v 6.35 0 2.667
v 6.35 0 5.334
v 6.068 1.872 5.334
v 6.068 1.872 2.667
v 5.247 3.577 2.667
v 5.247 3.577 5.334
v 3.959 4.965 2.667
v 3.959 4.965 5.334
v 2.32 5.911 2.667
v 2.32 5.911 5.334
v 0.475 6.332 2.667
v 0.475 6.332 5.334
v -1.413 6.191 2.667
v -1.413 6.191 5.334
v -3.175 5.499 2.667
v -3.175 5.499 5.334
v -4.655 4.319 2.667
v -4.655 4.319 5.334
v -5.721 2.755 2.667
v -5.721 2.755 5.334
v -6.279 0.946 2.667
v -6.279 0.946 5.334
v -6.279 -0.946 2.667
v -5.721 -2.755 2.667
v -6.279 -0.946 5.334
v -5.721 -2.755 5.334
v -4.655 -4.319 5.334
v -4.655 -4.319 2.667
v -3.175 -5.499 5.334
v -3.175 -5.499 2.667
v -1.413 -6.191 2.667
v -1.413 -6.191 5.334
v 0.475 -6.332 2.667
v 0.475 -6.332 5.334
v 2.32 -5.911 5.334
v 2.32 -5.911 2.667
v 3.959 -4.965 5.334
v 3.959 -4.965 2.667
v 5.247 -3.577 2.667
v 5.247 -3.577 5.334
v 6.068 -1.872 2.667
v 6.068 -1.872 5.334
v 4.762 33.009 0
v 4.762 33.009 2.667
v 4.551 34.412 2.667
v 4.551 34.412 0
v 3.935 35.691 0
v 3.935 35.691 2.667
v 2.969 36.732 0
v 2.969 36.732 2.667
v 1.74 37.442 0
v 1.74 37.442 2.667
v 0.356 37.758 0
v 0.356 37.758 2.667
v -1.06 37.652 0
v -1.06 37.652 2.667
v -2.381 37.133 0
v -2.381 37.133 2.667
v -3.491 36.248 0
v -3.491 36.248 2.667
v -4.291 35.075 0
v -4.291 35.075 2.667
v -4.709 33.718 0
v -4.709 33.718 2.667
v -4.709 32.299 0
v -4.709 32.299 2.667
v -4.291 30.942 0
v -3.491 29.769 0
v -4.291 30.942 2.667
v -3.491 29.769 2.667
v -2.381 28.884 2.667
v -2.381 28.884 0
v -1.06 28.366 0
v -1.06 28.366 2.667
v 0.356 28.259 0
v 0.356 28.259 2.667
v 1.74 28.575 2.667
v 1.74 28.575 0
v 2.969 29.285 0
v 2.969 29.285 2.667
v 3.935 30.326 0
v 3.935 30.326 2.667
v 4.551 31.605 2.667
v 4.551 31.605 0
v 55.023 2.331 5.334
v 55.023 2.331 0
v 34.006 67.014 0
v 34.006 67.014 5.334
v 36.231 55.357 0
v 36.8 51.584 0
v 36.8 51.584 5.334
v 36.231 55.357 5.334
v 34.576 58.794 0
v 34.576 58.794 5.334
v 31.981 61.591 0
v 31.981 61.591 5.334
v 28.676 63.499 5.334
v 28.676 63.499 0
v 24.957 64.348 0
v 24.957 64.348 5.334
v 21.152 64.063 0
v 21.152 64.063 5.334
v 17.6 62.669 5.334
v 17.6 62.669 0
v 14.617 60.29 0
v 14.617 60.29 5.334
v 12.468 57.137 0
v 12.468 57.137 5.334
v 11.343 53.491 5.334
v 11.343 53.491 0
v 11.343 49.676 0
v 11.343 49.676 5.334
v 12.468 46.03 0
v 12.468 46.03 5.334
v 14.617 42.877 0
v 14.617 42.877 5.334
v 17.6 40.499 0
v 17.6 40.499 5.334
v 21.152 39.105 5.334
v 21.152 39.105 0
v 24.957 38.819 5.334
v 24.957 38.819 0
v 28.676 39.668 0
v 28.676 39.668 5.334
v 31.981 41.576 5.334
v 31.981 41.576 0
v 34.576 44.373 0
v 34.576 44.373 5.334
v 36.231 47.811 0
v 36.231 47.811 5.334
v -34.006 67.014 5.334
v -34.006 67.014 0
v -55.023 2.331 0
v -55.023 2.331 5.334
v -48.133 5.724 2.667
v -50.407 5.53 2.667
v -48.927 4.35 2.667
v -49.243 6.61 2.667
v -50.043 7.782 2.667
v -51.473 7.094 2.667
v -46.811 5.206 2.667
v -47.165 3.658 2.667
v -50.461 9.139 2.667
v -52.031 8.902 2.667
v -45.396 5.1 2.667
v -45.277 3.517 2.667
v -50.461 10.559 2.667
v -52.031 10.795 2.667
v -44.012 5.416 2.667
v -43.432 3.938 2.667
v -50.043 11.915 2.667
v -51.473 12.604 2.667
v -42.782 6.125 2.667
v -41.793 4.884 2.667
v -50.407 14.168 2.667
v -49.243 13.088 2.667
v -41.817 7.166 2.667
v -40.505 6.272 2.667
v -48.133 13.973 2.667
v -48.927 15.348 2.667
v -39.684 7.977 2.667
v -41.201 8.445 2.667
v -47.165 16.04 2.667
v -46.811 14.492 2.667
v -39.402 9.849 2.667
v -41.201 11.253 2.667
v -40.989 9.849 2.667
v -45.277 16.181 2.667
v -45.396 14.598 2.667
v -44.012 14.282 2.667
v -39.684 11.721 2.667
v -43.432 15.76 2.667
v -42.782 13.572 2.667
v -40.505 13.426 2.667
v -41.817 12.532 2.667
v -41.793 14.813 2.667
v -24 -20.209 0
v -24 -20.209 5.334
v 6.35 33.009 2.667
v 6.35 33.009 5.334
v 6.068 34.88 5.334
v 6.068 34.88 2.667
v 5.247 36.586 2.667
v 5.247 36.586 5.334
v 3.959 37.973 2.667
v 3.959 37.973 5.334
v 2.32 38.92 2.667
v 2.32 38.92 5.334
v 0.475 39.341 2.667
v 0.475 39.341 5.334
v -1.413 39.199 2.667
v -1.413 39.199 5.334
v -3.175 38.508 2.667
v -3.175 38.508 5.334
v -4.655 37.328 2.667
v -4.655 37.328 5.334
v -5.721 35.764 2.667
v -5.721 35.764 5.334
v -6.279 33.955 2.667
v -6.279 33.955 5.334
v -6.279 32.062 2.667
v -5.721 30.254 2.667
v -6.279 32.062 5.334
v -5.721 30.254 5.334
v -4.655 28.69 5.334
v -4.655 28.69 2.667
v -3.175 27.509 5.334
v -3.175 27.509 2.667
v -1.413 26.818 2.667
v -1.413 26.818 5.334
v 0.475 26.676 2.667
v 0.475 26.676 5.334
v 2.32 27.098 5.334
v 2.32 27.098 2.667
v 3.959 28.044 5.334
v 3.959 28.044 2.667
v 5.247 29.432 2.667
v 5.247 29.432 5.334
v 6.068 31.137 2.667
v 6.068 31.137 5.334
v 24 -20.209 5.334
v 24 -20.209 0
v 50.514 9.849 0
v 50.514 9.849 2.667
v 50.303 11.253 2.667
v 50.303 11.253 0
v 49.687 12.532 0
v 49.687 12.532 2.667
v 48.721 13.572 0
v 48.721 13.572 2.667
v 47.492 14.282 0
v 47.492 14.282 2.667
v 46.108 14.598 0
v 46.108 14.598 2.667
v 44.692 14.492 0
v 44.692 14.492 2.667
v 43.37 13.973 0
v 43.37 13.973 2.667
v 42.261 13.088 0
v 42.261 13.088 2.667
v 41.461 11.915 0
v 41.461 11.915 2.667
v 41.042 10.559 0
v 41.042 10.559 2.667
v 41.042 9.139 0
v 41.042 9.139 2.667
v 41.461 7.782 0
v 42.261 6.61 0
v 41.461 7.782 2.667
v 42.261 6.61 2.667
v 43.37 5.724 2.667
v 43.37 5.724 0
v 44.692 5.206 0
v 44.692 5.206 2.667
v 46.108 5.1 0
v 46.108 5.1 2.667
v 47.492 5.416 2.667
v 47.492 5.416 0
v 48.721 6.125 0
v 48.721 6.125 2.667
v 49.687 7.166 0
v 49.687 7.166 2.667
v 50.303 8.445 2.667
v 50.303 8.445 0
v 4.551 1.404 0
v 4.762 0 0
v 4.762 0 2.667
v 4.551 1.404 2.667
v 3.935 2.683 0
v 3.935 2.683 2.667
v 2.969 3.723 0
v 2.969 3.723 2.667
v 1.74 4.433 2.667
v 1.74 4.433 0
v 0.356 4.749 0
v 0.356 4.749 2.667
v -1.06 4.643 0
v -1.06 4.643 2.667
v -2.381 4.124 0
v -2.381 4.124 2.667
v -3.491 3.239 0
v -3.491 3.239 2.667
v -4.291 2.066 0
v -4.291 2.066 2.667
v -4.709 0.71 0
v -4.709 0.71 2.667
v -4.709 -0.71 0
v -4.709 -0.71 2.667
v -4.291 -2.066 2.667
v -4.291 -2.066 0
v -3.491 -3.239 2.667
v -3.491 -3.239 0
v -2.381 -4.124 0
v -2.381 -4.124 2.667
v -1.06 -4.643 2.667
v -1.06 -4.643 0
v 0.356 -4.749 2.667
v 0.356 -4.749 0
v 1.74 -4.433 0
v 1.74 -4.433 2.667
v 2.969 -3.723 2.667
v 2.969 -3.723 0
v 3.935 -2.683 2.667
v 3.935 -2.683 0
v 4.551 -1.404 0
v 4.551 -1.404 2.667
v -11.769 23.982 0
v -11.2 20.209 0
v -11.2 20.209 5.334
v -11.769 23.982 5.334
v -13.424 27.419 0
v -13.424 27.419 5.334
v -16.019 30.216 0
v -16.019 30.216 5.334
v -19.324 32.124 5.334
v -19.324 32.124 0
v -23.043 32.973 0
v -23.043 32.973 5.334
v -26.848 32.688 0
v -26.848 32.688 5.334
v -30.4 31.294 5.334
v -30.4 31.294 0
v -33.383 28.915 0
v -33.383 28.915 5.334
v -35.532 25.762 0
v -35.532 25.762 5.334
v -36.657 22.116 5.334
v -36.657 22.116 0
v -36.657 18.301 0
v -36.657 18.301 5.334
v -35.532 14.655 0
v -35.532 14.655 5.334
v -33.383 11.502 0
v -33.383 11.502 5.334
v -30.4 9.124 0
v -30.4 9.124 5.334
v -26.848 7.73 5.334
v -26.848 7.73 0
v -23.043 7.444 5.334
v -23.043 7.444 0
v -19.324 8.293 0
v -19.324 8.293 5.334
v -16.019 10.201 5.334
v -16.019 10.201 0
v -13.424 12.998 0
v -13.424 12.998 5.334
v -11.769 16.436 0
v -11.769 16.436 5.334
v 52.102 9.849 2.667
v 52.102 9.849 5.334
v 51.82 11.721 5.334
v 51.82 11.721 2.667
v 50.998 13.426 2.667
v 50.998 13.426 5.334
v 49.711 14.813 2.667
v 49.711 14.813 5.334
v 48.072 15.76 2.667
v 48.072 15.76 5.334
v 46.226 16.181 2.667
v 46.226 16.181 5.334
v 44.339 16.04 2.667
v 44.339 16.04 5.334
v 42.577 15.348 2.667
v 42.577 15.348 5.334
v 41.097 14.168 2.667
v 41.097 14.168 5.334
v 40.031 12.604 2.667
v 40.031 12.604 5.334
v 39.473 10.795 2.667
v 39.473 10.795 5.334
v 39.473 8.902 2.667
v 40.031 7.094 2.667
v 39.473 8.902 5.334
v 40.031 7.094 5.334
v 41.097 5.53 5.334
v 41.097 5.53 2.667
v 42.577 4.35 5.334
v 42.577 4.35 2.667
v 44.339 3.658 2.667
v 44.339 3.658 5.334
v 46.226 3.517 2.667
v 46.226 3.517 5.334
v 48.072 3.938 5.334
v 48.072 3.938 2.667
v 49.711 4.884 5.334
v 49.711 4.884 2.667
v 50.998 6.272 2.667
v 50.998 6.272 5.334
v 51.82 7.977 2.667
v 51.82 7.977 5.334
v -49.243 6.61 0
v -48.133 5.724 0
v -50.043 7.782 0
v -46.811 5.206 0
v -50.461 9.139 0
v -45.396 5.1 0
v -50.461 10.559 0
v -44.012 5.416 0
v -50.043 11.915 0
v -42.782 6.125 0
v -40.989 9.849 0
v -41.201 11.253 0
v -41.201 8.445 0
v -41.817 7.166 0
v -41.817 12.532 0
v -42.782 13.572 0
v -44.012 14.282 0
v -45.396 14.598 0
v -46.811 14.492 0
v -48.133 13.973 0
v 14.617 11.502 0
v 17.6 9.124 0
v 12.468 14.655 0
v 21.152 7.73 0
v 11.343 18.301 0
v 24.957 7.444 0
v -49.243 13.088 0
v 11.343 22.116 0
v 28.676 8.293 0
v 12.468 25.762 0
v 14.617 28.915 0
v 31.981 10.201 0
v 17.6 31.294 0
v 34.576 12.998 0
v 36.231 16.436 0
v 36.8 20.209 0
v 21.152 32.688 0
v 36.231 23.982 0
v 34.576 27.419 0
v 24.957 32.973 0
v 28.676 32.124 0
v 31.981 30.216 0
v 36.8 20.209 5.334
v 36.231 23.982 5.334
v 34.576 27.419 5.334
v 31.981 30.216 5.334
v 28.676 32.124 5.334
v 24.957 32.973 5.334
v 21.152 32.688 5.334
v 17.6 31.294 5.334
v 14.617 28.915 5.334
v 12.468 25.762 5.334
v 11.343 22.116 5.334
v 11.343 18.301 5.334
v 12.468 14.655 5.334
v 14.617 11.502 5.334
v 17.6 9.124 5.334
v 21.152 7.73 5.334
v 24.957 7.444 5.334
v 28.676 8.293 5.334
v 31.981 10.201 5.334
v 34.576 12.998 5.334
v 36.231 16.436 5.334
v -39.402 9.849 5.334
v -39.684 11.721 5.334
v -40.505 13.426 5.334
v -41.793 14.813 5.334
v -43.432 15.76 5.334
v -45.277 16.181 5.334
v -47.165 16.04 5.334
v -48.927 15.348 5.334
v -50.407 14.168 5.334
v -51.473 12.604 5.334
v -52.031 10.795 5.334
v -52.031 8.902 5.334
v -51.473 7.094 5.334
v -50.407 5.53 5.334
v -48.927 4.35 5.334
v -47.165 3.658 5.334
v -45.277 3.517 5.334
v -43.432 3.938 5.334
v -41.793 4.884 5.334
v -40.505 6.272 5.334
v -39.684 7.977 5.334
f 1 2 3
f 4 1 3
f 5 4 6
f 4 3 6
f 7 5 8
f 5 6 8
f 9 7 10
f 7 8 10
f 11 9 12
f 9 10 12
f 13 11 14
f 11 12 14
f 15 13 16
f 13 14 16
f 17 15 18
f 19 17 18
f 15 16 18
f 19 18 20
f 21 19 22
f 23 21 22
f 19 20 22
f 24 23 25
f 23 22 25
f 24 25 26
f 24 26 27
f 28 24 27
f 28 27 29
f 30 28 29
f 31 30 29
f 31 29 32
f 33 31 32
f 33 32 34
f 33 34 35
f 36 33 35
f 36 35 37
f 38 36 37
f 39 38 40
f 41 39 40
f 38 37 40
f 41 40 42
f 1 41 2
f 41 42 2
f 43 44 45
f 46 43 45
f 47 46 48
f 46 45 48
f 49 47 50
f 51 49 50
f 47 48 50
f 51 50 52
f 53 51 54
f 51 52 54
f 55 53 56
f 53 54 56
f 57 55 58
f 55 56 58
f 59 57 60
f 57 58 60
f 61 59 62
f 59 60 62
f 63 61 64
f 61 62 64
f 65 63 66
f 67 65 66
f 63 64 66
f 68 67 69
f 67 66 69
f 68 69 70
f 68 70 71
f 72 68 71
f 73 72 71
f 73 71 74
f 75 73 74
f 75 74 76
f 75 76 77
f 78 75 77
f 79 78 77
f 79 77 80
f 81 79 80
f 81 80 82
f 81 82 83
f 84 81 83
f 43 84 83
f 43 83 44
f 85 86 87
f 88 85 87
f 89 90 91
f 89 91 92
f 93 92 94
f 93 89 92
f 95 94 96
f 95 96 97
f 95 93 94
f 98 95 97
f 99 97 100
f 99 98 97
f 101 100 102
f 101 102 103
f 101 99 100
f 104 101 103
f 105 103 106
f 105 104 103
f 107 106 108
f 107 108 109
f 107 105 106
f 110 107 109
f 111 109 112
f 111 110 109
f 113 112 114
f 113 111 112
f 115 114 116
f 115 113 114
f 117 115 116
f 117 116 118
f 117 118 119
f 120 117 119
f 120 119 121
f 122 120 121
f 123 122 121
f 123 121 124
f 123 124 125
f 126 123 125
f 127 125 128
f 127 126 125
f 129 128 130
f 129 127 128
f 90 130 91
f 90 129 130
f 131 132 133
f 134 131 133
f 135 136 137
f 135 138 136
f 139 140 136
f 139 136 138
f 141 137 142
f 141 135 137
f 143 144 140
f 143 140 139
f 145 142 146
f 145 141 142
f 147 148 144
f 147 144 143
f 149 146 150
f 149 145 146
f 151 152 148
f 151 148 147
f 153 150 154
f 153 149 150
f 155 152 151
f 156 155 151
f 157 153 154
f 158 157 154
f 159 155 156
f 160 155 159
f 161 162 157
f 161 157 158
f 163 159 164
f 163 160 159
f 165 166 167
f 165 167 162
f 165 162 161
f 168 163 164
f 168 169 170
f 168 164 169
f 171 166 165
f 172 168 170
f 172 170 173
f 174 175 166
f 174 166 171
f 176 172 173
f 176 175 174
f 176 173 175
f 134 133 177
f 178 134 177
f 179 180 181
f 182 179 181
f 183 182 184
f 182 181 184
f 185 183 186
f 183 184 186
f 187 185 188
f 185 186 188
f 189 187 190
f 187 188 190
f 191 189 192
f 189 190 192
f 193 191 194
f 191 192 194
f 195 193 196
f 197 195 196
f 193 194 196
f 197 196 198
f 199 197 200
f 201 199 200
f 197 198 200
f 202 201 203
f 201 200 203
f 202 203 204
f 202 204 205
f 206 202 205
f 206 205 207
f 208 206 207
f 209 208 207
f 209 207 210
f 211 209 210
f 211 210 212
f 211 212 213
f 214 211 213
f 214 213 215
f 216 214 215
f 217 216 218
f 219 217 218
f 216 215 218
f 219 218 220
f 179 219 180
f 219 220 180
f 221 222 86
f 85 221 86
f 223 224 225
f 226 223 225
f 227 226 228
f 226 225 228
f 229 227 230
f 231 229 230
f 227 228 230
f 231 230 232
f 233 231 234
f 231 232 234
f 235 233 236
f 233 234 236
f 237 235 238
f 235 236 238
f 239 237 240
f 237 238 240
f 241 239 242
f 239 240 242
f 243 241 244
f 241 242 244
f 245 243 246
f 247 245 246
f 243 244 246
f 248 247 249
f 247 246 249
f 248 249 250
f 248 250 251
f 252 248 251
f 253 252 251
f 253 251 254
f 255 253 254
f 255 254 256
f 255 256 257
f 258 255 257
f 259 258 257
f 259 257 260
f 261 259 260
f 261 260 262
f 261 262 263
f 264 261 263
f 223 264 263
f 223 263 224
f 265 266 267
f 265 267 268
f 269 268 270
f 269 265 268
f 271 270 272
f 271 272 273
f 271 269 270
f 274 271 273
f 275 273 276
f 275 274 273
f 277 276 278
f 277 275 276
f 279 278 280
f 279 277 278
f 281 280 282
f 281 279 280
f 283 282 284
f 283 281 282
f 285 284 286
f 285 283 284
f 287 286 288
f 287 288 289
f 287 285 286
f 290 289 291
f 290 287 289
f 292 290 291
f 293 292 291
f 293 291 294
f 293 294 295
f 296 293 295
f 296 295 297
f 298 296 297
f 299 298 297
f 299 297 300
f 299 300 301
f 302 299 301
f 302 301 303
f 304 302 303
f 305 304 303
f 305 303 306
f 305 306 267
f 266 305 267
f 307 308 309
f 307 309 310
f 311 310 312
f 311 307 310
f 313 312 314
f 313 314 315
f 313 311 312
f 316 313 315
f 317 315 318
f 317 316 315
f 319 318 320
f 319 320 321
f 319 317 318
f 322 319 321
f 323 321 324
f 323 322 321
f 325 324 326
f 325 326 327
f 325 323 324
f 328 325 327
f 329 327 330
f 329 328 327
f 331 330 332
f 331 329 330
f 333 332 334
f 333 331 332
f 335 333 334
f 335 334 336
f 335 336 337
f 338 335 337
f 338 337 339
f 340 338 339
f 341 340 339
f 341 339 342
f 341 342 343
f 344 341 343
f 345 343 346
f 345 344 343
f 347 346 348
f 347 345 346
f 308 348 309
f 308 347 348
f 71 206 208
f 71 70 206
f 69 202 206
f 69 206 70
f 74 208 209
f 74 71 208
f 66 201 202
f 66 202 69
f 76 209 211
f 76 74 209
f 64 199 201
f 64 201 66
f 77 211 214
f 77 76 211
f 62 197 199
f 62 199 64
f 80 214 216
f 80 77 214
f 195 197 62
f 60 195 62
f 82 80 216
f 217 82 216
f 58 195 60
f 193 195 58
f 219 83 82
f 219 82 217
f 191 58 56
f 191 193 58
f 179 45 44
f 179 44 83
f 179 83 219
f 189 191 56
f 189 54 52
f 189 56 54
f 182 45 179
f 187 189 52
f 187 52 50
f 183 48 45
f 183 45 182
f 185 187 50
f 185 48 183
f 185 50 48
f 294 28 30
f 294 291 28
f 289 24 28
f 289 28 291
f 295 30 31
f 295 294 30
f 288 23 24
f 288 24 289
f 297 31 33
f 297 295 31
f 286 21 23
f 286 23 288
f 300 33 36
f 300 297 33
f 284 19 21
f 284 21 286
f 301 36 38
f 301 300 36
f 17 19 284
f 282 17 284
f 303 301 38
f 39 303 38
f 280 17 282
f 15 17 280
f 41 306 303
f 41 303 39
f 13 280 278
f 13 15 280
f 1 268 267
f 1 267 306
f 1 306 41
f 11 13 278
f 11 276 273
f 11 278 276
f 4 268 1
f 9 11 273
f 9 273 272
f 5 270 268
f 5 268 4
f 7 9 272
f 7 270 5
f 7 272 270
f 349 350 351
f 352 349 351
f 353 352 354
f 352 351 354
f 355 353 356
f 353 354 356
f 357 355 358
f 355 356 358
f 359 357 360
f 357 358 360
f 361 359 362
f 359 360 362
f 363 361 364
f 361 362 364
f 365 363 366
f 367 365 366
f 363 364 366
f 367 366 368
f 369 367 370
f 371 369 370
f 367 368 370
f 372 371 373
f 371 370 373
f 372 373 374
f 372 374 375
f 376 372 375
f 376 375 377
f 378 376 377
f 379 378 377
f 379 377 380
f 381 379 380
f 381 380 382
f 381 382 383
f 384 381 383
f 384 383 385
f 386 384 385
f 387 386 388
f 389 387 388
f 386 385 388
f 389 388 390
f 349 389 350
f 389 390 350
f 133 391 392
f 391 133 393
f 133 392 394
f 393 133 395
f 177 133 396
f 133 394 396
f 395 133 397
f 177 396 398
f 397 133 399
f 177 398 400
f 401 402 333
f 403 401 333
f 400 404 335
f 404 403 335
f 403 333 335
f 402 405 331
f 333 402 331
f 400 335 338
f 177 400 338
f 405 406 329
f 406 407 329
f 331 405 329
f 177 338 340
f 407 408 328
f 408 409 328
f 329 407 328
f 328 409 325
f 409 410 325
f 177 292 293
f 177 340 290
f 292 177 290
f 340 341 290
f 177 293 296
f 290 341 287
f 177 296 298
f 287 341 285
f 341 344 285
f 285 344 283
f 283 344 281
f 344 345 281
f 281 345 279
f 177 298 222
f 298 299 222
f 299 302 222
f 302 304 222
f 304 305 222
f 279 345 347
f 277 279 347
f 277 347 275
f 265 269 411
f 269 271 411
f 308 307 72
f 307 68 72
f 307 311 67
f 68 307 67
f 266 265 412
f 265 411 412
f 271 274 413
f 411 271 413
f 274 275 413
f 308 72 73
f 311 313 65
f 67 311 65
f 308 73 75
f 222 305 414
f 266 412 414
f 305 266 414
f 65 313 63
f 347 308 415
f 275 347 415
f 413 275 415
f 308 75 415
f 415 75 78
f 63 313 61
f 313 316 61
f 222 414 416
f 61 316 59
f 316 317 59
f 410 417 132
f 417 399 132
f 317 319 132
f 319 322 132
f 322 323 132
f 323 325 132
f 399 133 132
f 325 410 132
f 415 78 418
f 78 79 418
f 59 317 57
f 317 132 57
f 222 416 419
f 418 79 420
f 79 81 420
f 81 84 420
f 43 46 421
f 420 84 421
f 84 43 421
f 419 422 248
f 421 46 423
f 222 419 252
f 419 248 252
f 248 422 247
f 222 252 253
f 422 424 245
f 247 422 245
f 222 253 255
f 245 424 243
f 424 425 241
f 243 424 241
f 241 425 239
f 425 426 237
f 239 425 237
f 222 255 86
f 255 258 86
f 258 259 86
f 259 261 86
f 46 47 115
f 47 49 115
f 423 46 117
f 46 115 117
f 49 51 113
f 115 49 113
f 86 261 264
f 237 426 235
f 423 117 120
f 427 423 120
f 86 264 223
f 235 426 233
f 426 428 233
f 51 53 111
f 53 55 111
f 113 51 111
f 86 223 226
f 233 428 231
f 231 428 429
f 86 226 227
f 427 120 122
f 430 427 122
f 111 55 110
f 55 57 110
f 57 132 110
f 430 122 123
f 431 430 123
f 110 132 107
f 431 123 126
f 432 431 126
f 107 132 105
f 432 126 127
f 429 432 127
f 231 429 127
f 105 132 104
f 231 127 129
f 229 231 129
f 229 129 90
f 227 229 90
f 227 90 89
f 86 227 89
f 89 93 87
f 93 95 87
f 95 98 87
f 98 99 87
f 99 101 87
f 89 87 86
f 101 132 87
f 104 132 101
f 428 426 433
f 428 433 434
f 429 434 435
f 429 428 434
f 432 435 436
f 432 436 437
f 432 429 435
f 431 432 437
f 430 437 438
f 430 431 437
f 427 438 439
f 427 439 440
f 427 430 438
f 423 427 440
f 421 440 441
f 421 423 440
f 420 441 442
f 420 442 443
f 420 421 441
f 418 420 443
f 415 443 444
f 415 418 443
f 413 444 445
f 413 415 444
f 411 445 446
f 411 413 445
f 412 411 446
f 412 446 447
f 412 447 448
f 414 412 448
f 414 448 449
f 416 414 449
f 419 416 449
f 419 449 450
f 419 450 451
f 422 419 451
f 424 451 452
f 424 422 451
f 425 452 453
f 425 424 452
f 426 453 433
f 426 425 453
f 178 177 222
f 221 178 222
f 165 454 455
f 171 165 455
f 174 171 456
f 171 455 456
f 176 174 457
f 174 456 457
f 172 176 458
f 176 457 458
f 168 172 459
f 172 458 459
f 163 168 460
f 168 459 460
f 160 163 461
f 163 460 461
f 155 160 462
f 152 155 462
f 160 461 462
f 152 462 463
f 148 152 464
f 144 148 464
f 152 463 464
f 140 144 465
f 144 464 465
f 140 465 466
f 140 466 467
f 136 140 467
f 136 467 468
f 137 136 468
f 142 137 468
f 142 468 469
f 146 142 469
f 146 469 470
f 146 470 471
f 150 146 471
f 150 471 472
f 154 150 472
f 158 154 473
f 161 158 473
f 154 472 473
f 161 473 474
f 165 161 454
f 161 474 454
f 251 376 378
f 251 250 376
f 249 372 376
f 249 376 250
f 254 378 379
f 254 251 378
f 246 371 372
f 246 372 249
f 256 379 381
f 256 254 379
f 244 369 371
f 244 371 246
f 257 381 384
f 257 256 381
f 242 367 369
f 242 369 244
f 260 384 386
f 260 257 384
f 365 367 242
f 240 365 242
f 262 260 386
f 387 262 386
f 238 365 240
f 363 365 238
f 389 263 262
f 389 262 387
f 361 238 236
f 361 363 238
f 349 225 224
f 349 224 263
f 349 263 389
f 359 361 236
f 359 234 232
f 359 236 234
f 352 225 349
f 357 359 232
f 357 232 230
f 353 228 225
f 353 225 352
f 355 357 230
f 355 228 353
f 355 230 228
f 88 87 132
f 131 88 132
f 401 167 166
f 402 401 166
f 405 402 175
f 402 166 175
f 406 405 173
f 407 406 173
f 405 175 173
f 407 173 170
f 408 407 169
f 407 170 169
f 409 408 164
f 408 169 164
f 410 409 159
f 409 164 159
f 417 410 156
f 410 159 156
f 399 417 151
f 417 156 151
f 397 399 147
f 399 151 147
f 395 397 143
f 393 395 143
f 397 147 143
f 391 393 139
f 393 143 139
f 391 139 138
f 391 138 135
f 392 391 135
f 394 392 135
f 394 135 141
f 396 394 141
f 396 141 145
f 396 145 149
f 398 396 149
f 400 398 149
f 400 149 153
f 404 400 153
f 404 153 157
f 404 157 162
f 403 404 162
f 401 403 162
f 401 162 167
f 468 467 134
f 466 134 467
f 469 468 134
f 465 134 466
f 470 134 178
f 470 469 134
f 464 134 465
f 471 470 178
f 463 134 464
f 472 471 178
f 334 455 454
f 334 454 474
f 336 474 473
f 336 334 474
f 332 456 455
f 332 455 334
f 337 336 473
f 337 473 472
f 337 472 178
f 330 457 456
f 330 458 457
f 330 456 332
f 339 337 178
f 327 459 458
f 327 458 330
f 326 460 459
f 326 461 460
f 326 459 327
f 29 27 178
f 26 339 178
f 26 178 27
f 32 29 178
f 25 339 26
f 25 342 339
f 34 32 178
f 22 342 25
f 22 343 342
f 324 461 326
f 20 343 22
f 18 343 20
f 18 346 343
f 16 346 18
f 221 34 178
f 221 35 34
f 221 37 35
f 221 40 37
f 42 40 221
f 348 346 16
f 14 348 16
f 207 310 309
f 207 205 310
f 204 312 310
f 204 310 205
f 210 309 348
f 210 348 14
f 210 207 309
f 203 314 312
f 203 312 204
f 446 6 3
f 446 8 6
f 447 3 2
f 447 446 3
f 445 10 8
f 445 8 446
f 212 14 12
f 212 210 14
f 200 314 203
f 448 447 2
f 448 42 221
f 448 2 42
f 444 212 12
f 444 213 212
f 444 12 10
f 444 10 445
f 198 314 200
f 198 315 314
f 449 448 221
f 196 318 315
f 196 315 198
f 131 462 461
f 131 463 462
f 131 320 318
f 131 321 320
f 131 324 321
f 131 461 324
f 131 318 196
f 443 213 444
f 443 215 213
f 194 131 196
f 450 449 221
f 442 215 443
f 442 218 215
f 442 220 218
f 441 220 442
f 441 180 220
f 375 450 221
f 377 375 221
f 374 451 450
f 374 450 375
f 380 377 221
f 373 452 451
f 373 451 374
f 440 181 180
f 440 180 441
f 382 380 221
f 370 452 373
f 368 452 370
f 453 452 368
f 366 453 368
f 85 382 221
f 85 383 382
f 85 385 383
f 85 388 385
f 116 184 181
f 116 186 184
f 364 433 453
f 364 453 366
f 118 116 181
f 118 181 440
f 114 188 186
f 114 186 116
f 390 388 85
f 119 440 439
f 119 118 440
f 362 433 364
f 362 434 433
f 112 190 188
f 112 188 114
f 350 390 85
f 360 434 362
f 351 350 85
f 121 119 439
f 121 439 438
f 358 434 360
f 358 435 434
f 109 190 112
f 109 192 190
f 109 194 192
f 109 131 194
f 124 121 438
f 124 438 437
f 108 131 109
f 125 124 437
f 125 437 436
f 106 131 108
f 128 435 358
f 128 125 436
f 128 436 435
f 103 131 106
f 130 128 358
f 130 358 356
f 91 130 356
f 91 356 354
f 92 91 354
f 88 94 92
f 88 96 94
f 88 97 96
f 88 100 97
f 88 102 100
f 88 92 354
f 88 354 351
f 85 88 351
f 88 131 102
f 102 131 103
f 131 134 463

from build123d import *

# Parameters (mm, degrees)
SKETCH2_R           = 4.7625
SKETCH2_R_2         = 12.8
BOSS_EXTRUDE2_DEPTH = 5.334
CUT_EXTRUDE3_START  = -2.667
SKETCH3_R           = 6.35
SKETCH3_R_2         = 4.7625
CUT_EXTRUDE3_DEPTH  = 2.667
SKETCH3_2_R         = 4.7625
CUT_EXTRUDE4_DEPTH  = 87.872399887


with BuildPart() as part:
    # Sketch2 → Boss-Extrude2 (new body)
    with BuildSketch(Plane.XY):
        Polygon((-55.022779977, 2.330692017), (-24, -20.208676973), (24, -20.208676973), (55.022779977, 2.330692017), (34.005948181, 67.013849238), (-34.005948181, 67.013849238), align=None)
        Circle(SKETCH2_R, mode=Mode.SUBTRACT)
        with Locations((-24, 20.208676973)):
            Circle(SKETCH2_R_2, mode=Mode.SUBTRACT)
        with Locations((24, 20.208676973)):
            Circle(SKETCH2_R_2, mode=Mode.SUBTRACT)
        with Locations((24, 51.583676973)):
            Circle(SKETCH2_R_2, mode=Mode.SUBTRACT)
    extrude(amount=BOSS_EXTRUDE2_DEPTH)

    # Sketch3 → Cut-Extrude3 (cut)
    # profile 1 of 4: a face of its own
    with BuildSketch(Plane.XY.offset(5.334).offset(CUT_EXTRUDE3_START)):
        Circle(SKETCH3_R)
        Circle(SKETCH3_R_2, mode=Mode.SUBTRACT)
    # profile 2 of 4: a face of its own
    with BuildSketch(Plane.XY.offset(5.334).offset(CUT_EXTRUDE3_START)):
        with Locations((45.751679669, 9.848845061)):
            Circle(SKETCH3_R)
        with Locations((45.751679669, 9.848845061)):
            Circle(SKETCH3_R_2, mode=Mode.SUBTRACT)
    # profile 3 of 4: a face of its own
    with BuildSketch(Plane.XY.offset(5.334).offset(CUT_EXTRUDE3_START)):
        with Locations((0, 33.008676973)):
            Circle(SKETCH3_R)
        with Locations((0, 33.008676973)):
            Circle(SKETCH3_R_2, mode=Mode.SUBTRACT)
    # profile 4 of 4: a face of its own
    with BuildSketch(Plane.XY.offset(5.334).offset(CUT_EXTRUDE3_START)):
        with Locations((-45.751679669, 9.848845061)):
            Circle(SKETCH3_R)
        with Locations((-45.751679669, 9.848845061)):
            Circle(SKETCH3_R_2, mode=Mode.SUBTRACT)
    extrude(amount=CUT_EXTRUDE3_DEPTH, mode=Mode.SUBTRACT)

    # Sketch3<2> → Cut-Extrude4 (cut, through all)
    with BuildSketch(Plane.XY.offset(5.334)):
        with Locations((45.751679669, 9.848845061)):
            Circle(SKETCH3_2_R)
        with Locations((0, 33.008676973)):
            Circle(SKETCH3_2_R)
        with Locations((-45.751679669, 9.848845061)):
            Circle(SKETCH3_2_R)
    extrude(amount=-CUT_EXTRUDE4_DEPTH, mode=Mode.SUBTRACT)


solid = part.part
